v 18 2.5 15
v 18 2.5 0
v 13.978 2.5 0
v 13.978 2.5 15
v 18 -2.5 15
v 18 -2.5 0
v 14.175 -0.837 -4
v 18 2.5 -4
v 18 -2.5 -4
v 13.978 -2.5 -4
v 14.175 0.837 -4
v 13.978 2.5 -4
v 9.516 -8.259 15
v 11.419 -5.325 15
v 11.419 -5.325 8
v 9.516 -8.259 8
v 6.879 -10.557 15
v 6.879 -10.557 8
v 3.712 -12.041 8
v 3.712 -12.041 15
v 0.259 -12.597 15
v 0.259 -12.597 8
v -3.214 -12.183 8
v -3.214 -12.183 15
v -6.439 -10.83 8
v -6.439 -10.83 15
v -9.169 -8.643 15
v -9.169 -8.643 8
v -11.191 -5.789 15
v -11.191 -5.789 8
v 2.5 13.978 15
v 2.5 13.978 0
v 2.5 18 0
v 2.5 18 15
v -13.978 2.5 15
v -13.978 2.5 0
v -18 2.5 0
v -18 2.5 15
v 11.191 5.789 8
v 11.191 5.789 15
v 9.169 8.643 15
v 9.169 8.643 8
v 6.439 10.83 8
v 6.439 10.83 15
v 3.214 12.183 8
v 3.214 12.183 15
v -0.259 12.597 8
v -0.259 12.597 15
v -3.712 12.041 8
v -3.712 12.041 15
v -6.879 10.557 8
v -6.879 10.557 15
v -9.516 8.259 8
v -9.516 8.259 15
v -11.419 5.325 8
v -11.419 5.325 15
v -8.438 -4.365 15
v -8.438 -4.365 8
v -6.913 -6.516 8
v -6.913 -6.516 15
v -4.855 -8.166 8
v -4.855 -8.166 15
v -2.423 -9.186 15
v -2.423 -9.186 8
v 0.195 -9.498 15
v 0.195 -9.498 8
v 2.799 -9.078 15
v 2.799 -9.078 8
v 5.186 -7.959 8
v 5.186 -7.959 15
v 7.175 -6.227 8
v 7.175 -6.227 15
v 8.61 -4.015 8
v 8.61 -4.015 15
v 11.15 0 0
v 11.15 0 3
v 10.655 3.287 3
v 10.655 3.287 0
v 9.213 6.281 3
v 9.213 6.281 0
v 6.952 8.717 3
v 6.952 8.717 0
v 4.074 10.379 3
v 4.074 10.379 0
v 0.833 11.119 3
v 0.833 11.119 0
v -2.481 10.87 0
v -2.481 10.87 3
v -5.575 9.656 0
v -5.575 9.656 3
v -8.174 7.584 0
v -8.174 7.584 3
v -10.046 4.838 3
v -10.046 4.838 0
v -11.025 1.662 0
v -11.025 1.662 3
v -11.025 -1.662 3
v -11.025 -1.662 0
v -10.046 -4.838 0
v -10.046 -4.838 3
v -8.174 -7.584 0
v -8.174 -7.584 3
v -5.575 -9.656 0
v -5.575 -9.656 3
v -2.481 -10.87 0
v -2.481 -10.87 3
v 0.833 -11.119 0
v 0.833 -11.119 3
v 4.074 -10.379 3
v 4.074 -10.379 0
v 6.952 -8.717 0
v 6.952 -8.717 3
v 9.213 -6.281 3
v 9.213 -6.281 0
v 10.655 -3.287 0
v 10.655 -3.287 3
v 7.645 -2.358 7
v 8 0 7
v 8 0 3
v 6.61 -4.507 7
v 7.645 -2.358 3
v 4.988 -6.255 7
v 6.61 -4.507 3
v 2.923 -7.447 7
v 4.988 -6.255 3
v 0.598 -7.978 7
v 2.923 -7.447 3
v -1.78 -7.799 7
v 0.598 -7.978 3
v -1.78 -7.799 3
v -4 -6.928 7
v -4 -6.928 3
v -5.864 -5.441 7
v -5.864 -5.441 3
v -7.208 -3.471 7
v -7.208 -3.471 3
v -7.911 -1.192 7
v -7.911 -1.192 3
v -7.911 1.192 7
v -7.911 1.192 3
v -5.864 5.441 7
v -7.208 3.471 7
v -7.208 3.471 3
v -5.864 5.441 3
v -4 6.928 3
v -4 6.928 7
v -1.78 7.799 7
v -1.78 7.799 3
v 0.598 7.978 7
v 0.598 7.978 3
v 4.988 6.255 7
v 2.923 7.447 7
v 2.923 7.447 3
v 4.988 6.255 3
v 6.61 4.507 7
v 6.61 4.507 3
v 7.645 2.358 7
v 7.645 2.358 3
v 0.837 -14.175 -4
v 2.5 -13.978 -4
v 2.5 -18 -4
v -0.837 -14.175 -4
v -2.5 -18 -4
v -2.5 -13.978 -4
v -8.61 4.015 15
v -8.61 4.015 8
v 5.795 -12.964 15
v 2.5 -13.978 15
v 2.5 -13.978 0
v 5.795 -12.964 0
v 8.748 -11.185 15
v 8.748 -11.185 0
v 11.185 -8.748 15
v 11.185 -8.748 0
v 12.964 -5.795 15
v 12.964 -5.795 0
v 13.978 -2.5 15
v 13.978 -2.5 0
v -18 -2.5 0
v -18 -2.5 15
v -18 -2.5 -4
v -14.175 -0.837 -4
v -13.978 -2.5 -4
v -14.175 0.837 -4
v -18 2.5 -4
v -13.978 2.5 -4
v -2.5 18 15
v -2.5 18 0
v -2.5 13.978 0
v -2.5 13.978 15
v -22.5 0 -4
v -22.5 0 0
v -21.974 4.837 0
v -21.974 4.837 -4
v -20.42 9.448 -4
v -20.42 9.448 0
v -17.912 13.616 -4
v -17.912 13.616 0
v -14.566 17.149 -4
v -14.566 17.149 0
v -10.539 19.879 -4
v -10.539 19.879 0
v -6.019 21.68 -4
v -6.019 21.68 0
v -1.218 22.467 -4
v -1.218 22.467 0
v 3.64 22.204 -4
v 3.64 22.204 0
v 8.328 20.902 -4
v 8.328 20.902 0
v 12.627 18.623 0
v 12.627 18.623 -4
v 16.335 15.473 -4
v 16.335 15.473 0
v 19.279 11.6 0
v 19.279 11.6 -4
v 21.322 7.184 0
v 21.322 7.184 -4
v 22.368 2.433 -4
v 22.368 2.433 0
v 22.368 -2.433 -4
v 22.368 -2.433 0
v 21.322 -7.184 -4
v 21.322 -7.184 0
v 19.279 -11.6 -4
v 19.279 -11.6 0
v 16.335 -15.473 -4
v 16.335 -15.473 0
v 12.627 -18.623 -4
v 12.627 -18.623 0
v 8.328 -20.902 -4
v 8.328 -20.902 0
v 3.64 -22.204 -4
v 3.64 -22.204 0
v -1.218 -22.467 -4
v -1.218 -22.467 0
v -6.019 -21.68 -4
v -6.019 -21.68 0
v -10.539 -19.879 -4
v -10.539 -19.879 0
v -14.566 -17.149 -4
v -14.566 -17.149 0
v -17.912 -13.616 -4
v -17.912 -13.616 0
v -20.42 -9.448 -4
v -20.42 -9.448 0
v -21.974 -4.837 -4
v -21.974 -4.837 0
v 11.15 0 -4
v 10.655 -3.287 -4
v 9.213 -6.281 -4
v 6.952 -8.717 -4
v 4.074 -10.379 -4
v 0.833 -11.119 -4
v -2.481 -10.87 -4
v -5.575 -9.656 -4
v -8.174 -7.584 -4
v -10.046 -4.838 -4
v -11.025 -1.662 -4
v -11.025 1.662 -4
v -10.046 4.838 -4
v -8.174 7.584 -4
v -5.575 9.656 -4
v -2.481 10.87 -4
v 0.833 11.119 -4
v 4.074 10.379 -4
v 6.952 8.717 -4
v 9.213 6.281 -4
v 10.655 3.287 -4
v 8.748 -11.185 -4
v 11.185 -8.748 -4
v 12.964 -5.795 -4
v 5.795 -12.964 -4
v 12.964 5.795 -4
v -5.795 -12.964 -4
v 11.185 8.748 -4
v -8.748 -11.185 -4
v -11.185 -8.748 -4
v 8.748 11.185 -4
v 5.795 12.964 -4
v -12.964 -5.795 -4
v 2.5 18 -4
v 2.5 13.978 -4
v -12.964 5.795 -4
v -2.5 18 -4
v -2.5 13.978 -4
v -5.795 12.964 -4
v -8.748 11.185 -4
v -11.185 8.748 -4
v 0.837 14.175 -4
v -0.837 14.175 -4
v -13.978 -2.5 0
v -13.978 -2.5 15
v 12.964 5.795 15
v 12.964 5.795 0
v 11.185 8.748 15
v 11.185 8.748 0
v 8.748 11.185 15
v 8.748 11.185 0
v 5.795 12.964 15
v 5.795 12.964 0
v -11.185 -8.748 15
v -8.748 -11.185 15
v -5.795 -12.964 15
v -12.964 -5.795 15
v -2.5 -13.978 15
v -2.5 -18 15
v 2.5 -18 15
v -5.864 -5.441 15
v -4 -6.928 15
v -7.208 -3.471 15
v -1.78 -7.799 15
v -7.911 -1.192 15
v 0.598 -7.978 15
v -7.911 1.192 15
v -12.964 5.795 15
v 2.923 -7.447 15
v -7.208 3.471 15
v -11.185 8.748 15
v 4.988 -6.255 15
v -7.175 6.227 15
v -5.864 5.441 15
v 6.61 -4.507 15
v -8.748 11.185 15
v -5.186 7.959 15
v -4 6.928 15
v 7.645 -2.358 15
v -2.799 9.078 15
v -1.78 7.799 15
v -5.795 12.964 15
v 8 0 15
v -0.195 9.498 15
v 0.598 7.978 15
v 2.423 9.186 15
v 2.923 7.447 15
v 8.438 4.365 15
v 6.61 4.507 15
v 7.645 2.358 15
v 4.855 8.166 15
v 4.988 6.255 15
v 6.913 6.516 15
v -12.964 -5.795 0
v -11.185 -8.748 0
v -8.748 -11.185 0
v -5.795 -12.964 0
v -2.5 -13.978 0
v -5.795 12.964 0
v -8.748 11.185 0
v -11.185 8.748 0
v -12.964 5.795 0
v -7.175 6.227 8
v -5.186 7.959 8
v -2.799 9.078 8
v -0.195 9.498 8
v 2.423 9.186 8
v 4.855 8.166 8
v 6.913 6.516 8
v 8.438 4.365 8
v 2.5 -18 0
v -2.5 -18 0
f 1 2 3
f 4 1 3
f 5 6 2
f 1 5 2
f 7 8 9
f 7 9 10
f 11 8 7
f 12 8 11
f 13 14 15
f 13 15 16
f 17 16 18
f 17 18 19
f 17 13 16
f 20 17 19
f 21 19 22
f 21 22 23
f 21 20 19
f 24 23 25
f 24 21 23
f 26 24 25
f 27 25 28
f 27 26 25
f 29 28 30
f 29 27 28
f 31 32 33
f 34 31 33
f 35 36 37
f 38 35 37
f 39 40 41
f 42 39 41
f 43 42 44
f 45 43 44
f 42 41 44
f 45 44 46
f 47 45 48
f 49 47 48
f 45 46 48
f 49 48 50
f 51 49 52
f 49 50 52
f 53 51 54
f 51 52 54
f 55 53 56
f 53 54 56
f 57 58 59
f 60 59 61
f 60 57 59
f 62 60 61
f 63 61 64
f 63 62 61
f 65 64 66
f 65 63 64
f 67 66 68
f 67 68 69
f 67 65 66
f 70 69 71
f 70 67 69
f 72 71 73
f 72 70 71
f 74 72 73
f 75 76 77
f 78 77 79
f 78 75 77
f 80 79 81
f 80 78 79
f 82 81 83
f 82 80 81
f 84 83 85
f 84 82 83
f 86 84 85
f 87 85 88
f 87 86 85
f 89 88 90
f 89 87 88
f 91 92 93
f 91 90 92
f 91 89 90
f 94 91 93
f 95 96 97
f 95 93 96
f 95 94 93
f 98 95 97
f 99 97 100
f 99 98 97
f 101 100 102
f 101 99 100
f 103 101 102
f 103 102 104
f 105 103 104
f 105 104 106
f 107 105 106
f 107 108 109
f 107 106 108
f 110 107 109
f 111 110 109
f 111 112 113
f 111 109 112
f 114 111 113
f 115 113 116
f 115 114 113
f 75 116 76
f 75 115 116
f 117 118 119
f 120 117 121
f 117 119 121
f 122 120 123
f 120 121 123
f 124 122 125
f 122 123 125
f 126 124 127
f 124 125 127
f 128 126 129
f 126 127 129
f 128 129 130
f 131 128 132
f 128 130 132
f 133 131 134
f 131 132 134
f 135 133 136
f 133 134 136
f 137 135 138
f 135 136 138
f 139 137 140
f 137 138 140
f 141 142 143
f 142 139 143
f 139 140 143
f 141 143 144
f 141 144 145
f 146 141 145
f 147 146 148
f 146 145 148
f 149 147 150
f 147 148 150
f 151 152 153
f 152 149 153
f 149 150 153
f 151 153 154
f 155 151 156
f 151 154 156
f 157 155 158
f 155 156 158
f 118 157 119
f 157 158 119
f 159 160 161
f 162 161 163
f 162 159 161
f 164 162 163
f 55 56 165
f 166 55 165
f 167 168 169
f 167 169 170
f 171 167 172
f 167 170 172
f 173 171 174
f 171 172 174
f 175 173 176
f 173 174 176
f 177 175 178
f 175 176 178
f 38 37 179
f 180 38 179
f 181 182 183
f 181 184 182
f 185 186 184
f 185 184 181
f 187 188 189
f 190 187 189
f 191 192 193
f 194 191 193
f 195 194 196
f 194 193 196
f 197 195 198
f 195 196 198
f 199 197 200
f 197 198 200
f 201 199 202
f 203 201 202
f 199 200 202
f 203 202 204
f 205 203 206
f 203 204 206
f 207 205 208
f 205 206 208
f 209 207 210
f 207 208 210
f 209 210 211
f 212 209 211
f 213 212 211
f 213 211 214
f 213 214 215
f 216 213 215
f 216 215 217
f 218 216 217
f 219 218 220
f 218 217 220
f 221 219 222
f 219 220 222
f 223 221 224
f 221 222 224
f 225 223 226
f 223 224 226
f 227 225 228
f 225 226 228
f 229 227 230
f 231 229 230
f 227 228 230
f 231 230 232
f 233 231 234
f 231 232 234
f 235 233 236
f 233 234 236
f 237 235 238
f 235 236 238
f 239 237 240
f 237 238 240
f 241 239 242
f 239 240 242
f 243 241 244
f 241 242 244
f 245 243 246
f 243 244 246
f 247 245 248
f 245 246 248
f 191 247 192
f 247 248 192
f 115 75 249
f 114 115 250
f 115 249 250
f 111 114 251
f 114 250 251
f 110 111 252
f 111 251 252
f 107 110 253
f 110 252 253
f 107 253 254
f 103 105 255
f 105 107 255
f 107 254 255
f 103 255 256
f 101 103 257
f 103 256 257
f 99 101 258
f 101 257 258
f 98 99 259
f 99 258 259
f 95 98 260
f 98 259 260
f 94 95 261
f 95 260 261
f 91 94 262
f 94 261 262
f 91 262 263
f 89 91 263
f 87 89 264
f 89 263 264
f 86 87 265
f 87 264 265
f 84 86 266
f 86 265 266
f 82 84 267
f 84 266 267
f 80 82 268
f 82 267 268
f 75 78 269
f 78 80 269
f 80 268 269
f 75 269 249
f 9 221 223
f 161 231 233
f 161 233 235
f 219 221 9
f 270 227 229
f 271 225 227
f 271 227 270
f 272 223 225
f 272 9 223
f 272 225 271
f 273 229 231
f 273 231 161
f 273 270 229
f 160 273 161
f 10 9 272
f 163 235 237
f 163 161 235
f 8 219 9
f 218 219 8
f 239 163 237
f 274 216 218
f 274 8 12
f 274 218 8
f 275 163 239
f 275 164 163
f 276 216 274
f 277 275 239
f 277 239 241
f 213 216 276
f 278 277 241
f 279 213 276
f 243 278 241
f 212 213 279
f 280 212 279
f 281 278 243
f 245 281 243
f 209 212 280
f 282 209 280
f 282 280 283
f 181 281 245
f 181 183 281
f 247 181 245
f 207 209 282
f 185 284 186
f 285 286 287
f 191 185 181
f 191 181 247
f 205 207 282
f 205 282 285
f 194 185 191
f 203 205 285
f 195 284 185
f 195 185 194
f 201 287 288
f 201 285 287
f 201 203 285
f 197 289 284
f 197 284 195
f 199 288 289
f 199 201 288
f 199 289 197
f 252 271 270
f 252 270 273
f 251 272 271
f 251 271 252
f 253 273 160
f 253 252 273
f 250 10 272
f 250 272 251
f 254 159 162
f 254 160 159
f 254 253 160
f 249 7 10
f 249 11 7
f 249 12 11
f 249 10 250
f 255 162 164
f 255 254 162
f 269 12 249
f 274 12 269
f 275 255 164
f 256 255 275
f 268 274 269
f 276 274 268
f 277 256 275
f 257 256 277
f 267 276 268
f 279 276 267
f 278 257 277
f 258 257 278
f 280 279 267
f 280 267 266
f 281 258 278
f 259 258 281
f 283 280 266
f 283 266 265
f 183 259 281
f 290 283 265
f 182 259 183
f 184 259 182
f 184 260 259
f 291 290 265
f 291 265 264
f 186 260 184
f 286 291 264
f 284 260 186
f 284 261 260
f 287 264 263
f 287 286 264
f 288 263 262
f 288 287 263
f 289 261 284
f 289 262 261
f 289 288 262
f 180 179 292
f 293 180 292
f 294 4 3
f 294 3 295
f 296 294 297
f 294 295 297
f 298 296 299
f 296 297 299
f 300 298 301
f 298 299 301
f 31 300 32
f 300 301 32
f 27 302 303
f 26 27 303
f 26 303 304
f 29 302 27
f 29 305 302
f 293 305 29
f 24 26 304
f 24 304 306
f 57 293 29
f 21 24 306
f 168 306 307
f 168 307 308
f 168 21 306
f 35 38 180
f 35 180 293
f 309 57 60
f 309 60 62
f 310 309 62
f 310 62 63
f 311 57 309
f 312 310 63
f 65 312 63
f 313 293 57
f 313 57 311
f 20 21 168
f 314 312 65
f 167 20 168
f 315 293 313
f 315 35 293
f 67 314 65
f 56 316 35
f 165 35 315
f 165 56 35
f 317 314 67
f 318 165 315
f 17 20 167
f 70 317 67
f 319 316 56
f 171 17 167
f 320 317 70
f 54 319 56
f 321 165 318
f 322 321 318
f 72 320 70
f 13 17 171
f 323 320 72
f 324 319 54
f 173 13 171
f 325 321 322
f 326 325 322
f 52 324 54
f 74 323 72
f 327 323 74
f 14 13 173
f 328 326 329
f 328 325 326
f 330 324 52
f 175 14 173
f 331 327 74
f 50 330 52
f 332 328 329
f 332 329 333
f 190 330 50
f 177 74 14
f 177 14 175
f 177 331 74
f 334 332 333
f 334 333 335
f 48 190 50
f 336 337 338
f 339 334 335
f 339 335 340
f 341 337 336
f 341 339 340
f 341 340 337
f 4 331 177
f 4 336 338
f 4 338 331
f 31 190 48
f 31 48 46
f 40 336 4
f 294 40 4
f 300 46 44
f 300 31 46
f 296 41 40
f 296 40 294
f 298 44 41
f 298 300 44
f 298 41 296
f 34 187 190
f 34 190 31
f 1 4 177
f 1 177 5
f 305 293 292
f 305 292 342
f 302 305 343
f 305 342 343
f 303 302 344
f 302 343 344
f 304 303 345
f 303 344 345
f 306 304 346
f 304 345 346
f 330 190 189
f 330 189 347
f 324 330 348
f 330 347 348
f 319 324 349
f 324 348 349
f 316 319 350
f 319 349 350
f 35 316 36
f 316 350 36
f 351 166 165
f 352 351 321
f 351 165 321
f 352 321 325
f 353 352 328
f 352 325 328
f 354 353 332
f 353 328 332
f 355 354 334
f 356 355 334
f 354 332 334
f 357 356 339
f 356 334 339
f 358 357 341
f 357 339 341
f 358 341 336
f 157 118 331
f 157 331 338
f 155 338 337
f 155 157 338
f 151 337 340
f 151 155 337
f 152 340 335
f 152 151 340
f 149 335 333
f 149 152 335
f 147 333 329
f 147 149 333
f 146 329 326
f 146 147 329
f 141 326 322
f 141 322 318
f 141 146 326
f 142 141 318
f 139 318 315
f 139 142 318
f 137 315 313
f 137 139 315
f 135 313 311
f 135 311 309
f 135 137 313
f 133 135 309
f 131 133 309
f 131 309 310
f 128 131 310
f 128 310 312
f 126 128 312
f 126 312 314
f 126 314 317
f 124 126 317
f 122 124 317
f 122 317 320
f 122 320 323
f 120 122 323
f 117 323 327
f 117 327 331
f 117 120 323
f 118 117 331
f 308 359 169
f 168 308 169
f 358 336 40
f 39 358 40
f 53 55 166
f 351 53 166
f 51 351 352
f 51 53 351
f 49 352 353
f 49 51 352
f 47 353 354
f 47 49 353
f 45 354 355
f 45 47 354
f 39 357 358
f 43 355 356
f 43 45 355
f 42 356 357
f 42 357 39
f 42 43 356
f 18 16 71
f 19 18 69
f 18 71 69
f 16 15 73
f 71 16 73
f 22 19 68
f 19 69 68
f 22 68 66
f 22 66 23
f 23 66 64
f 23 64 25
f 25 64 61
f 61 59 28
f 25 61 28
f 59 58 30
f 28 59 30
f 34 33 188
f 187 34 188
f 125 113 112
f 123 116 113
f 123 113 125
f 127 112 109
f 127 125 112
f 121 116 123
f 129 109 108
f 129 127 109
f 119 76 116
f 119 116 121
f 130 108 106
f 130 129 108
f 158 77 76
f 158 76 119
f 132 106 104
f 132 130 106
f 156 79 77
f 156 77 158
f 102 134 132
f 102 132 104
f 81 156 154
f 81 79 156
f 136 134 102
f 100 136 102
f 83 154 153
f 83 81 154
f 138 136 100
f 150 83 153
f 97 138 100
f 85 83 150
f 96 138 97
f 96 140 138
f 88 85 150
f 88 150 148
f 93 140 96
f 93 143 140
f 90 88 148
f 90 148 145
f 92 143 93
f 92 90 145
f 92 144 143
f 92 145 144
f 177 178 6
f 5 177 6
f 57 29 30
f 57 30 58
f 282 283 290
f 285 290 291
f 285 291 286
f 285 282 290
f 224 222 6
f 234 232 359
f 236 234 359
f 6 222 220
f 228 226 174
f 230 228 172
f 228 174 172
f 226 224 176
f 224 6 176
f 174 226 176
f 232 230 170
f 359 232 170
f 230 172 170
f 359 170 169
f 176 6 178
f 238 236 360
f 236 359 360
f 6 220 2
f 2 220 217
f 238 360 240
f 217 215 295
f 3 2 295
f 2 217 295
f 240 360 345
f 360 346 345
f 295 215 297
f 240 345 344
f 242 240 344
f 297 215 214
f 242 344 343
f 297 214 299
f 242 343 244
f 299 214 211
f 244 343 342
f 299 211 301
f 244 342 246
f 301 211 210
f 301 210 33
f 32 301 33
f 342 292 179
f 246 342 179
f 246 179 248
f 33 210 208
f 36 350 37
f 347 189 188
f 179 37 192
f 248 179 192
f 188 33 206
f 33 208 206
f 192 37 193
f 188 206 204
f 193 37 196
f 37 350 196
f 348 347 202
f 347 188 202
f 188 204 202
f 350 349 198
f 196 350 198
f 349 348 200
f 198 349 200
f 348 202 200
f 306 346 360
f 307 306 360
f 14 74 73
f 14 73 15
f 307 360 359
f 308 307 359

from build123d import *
from build123d.topology import SkipClean

# Parameters (mm, degrees)
ESBO_O1_R                = 11.15
RESSALTO_EXTRUS_O1_DEPTH = 15
ESBO_O2_R                = 22.5
RESSALTO_EXTRUS_O2_DEPTH = 4
RESSALTO_EXTRUS_O6_START = -8
ESBO_O5_R                = 11.15
ESBO_O5_R_2              = 8
RESSALTO_EXTRUS_O6_DEPTH = 8
RESSALTO_EXTRUS_O7_START = 4
ESBO_O7_R                = 14.2
ESBO_O7_R_2              = 11.15
RESSALTO_EXTRUS_O7_DEPTH = 4
RESSALTO_EXTRUS_O8_START = 4
ESBO_O8_R                = 11.15
ESBO_O8_R_2              = 8
RESSALTO_EXTRUS_O8_DEPTH = 4
CORTE_EXTRUS_O1_DEPTH    = 7


with BuildPart() as part:
    # Esboço1 → Ressalto-extrusão1 (new body)
    with BuildSketch(Plane.XY):
        with BuildLine():
            Line((-2.5, 18), (-2.5, 13.978197309))
            ThreePointArc((-2.5, 13.978197309), (-10.040916293, 10.040916293), (-13.978197309, 2.5))
            Line((-13.978197309, 2.5), (-18, 2.5))
            Line((-18, 2.5), (-18, -2.5))
            Line((-18, -2.5), (-13.978197309, -2.5))
            ThreePointArc((-13.978197309, -2.5), (-10.040916293, -10.040916293), (-2.5, -13.978197309))
            Line((-2.5, -13.978197309), (-2.5, -18))
            Line((-2.5, -18), (2.5, -18))
            Line((2.5, -18), (2.5, -13.978197309))
            ThreePointArc((2.5, -13.978197309), (10.040916293, -10.040916293), (13.978197309, -2.5))
            Line((13.978197309, -2.5), (18, -2.5))
            Line((18, -2.5), (18, 2.5))
            Line((18, 2.5), (13.978197309, 2.5))
            ThreePointArc((13.978197309, 2.5), (10.040916293, 10.040916293), (2.5, 13.978197309))
            Line((2.5, 13.978197309), (2.5, 18))
            Line((2.5, 18), (-2.5, 18))
        make_face()
        Circle(ESBO_O1_R, mode=Mode.SUBTRACT)
    extrude(amount=RESSALTO_EXTRUS_O1_DEPTH)

    # Esboço5 → Ressalto-extrusão6 (add)
    with BuildSketch(Plane.XY.offset(15).offset(RESSALTO_EXTRUS_O6_START)):
        Circle(ESBO_O5_R)
        Circle(ESBO_O5_R_2, mode=Mode.SUBTRACT)
    extrude(amount=RESSALTO_EXTRUS_O6_DEPTH)



with BuildPart() as body_2:
    # Esboço2 → Ressalto-extrusão2 (new body)
    # profile 1 of 5: a face of its own
    with SkipClean():  # the faces are left unmerged after this step: merging them gives an invalid solid
        with BuildSketch(Plane(origin=(0, 0, 0), x_dir=(-1, 0, 0), z_dir=(0, 0, -1))):
            Circle(ESBO_O2_R)
            with BuildLine():
                Line((2.5, 13.978197309), (2.5, 18))
                Line((2.5, 18), (-2.5, 18))
                Line((-2.5, 18), (-2.5, 13.978197309))
                ThreePointArc((-2.5, 13.978197309), (-10.040916293, 10.040916293), (-13.978197309, 2.5))
                Line((-13.978197309, 2.5), (-18, 2.5))
                Line((-18, 2.5), (-18, -2.5))
                Line((-18, -2.5), (-13.978197309, -2.5))
                ThreePointArc((-13.978197309, -2.5), (-10.040916293, -10.040916293), (-2.5, -13.978197309))
                Line((-2.5, -13.978197309), (-2.5, -18))
                Line((-2.5, -18), (2.5, -18))
                Line((2.5, -18), (2.5, -13.978197309))
                ThreePointArc((2.5, -13.978197309), (10.040916293, -10.040916293), (13.978197309, -2.5))
                Line((13.978197309, -2.5), (18, -2.5))
                Line((18, -2.5), (18, 2.5))
                Line((18, 2.5), (13.978197309, 2.5))
                ThreePointArc((13.978197309, 2.5), (10.040916293, 10.040916293), (2.5, 13.978197309))
            make_face(mode=Mode.SUBTRACT)
        # profile 2 of 5: a face of its own
        with BuildSketch(Plane(origin=(0, 0, 0), x_dir=(-1, 0, 0), z_dir=(0, 0, -1))):
            with BuildLine():
                Line((2.5, -18), (2.5, -13.978197309))
                ThreePointArc((2.5, -13.978197309), (0, -14.2), (-2.5, -13.978197309))
                Line((-2.5, -13.978197309), (-2.5, -18))
                Line((-2.5, -18), (2.5, -18))
            make_face()
        # profile 3 of 5: a face of its own
        with BuildSketch(Plane(origin=(0, 0, 0), x_dir=(-1, 0, 0), z_dir=(0, 0, -1))):
            with BuildLine():
                ThreePointArc((-13.978197309, -2.5), (-14.2, 0), (-13.978197309, 2.5))
                Line((-13.978197309, 2.5), (-18, 2.5))
                Line((-18, 2.5), (-18, -2.5))
                Line((-18, -2.5), (-13.978197309, -2.5))
            make_face()
        # profile 4 of 5: a face of its own
        with BuildSketch(Plane(origin=(0, 0, 0), x_dir=(-1, 0, 0), z_dir=(0, 0, -1))):
            with BuildLine():
                ThreePointArc((-2.5, 13.978197309), (0, 14.2), (2.5, 13.978197309))
                Line((2.5, 13.978197309), (2.5, 18))
                Line((2.5, 18), (-2.5, 18))
                Line((-2.5, 18), (-2.5, 13.978197309))
            make_face()
        # profile 5 of 5: a face of its own
        with BuildSketch(Plane(origin=(0, 0, 0), x_dir=(-1, 0, 0), z_dir=(0, 0, -1))):
            with BuildLine():
                Line((18, 2.5), (13.978197309, 2.5))
                ThreePointArc((13.978197309, 2.5), (14.2, 0), (13.978197309, -2.5))
                Line((13.978197309, -2.5), (18, -2.5))
                Line((18, -2.5), (18, 2.5))
            make_face()
        extrude(amount=RESSALTO_EXTRUS_O2_DEPTH)


with BuildPart() as part_1:
    with SkipClean():  # the faces are left unmerged after this step: merging them gives an invalid solid
        add(part.part)

        add(body_2.part)  # Ressalto-extrusão7 merges body 2
        # Esboço7 → Ressalto-extrusão7 (add)
        with BuildSketch(Plane(origin=(0, 0, 0), x_dir=(-1, 0, 0), z_dir=(0, 0, -1)).offset(RESSALTO_EXTRUS_O7_START)):
            Circle(ESBO_O7_R)
            with Locations(Location((0, 0, 0), (0, 0, 180))):
                Circle(ESBO_O7_R_2, mode=Mode.SUBTRACT)
        extrude(amount=-RESSALTO_EXTRUS_O7_DEPTH)

    # Esboço8 → Ressalto-extrusão8 (add)
    with BuildSketch(Plane(origin=(0, 0, 7), x_dir=(-1, 0, 0), z_dir=(0, 0, -1)).offset(RESSALTO_EXTRUS_O8_START)):
        Circle(ESBO_O8_R)
        with Locations(Location((0, 0, 0), (0, 0, 180))):
            Circle(ESBO_O8_R_2, mode=Mode.SUBTRACT)
    extrude(amount=-RESSALTO_EXTRUS_O8_DEPTH)

    # Esboço11 → Corte-extrusão1 (cut)
    with BuildSketch(Plane.XY.offset(15)):
        with BuildLine():
            Line((-11.191152491, -5.789482353), (-8.437773704, -4.365085901))
            ThreePointArc((-8.437773704, -4.365085901), (0.195118203, -9.497996046), (8.609923977, -4.014873487))
            Line((8.609923977, -4.014873487), (11.419478117, -5.324990098))
            ThreePointArc((11.419478117, -5.324990098), (0.258788353, -12.597342124), (-11.191152491, -5.789482353))
        make_face()
        with BuildLine():
            Line((-11.419478117, 5.324990098), (-8.609923977, 4.014873487))
            ThreePointArc((-8.609923977, 4.014873487), (-0.195118203, 9.497996046), (8.437773704, 4.365085901))
            Line((8.437773704, 4.365085901), (11.191152491, 5.789482353))
            ThreePointArc((11.191152491, 5.789482353), (-0.258788353, 12.597342124), (-11.419478117, 5.324990098))
        make_face()
    extrude(amount=-CORTE_EXTRUS_O1_DEPTH, mode=Mode.SUBTRACT)


solid = part_1.part
